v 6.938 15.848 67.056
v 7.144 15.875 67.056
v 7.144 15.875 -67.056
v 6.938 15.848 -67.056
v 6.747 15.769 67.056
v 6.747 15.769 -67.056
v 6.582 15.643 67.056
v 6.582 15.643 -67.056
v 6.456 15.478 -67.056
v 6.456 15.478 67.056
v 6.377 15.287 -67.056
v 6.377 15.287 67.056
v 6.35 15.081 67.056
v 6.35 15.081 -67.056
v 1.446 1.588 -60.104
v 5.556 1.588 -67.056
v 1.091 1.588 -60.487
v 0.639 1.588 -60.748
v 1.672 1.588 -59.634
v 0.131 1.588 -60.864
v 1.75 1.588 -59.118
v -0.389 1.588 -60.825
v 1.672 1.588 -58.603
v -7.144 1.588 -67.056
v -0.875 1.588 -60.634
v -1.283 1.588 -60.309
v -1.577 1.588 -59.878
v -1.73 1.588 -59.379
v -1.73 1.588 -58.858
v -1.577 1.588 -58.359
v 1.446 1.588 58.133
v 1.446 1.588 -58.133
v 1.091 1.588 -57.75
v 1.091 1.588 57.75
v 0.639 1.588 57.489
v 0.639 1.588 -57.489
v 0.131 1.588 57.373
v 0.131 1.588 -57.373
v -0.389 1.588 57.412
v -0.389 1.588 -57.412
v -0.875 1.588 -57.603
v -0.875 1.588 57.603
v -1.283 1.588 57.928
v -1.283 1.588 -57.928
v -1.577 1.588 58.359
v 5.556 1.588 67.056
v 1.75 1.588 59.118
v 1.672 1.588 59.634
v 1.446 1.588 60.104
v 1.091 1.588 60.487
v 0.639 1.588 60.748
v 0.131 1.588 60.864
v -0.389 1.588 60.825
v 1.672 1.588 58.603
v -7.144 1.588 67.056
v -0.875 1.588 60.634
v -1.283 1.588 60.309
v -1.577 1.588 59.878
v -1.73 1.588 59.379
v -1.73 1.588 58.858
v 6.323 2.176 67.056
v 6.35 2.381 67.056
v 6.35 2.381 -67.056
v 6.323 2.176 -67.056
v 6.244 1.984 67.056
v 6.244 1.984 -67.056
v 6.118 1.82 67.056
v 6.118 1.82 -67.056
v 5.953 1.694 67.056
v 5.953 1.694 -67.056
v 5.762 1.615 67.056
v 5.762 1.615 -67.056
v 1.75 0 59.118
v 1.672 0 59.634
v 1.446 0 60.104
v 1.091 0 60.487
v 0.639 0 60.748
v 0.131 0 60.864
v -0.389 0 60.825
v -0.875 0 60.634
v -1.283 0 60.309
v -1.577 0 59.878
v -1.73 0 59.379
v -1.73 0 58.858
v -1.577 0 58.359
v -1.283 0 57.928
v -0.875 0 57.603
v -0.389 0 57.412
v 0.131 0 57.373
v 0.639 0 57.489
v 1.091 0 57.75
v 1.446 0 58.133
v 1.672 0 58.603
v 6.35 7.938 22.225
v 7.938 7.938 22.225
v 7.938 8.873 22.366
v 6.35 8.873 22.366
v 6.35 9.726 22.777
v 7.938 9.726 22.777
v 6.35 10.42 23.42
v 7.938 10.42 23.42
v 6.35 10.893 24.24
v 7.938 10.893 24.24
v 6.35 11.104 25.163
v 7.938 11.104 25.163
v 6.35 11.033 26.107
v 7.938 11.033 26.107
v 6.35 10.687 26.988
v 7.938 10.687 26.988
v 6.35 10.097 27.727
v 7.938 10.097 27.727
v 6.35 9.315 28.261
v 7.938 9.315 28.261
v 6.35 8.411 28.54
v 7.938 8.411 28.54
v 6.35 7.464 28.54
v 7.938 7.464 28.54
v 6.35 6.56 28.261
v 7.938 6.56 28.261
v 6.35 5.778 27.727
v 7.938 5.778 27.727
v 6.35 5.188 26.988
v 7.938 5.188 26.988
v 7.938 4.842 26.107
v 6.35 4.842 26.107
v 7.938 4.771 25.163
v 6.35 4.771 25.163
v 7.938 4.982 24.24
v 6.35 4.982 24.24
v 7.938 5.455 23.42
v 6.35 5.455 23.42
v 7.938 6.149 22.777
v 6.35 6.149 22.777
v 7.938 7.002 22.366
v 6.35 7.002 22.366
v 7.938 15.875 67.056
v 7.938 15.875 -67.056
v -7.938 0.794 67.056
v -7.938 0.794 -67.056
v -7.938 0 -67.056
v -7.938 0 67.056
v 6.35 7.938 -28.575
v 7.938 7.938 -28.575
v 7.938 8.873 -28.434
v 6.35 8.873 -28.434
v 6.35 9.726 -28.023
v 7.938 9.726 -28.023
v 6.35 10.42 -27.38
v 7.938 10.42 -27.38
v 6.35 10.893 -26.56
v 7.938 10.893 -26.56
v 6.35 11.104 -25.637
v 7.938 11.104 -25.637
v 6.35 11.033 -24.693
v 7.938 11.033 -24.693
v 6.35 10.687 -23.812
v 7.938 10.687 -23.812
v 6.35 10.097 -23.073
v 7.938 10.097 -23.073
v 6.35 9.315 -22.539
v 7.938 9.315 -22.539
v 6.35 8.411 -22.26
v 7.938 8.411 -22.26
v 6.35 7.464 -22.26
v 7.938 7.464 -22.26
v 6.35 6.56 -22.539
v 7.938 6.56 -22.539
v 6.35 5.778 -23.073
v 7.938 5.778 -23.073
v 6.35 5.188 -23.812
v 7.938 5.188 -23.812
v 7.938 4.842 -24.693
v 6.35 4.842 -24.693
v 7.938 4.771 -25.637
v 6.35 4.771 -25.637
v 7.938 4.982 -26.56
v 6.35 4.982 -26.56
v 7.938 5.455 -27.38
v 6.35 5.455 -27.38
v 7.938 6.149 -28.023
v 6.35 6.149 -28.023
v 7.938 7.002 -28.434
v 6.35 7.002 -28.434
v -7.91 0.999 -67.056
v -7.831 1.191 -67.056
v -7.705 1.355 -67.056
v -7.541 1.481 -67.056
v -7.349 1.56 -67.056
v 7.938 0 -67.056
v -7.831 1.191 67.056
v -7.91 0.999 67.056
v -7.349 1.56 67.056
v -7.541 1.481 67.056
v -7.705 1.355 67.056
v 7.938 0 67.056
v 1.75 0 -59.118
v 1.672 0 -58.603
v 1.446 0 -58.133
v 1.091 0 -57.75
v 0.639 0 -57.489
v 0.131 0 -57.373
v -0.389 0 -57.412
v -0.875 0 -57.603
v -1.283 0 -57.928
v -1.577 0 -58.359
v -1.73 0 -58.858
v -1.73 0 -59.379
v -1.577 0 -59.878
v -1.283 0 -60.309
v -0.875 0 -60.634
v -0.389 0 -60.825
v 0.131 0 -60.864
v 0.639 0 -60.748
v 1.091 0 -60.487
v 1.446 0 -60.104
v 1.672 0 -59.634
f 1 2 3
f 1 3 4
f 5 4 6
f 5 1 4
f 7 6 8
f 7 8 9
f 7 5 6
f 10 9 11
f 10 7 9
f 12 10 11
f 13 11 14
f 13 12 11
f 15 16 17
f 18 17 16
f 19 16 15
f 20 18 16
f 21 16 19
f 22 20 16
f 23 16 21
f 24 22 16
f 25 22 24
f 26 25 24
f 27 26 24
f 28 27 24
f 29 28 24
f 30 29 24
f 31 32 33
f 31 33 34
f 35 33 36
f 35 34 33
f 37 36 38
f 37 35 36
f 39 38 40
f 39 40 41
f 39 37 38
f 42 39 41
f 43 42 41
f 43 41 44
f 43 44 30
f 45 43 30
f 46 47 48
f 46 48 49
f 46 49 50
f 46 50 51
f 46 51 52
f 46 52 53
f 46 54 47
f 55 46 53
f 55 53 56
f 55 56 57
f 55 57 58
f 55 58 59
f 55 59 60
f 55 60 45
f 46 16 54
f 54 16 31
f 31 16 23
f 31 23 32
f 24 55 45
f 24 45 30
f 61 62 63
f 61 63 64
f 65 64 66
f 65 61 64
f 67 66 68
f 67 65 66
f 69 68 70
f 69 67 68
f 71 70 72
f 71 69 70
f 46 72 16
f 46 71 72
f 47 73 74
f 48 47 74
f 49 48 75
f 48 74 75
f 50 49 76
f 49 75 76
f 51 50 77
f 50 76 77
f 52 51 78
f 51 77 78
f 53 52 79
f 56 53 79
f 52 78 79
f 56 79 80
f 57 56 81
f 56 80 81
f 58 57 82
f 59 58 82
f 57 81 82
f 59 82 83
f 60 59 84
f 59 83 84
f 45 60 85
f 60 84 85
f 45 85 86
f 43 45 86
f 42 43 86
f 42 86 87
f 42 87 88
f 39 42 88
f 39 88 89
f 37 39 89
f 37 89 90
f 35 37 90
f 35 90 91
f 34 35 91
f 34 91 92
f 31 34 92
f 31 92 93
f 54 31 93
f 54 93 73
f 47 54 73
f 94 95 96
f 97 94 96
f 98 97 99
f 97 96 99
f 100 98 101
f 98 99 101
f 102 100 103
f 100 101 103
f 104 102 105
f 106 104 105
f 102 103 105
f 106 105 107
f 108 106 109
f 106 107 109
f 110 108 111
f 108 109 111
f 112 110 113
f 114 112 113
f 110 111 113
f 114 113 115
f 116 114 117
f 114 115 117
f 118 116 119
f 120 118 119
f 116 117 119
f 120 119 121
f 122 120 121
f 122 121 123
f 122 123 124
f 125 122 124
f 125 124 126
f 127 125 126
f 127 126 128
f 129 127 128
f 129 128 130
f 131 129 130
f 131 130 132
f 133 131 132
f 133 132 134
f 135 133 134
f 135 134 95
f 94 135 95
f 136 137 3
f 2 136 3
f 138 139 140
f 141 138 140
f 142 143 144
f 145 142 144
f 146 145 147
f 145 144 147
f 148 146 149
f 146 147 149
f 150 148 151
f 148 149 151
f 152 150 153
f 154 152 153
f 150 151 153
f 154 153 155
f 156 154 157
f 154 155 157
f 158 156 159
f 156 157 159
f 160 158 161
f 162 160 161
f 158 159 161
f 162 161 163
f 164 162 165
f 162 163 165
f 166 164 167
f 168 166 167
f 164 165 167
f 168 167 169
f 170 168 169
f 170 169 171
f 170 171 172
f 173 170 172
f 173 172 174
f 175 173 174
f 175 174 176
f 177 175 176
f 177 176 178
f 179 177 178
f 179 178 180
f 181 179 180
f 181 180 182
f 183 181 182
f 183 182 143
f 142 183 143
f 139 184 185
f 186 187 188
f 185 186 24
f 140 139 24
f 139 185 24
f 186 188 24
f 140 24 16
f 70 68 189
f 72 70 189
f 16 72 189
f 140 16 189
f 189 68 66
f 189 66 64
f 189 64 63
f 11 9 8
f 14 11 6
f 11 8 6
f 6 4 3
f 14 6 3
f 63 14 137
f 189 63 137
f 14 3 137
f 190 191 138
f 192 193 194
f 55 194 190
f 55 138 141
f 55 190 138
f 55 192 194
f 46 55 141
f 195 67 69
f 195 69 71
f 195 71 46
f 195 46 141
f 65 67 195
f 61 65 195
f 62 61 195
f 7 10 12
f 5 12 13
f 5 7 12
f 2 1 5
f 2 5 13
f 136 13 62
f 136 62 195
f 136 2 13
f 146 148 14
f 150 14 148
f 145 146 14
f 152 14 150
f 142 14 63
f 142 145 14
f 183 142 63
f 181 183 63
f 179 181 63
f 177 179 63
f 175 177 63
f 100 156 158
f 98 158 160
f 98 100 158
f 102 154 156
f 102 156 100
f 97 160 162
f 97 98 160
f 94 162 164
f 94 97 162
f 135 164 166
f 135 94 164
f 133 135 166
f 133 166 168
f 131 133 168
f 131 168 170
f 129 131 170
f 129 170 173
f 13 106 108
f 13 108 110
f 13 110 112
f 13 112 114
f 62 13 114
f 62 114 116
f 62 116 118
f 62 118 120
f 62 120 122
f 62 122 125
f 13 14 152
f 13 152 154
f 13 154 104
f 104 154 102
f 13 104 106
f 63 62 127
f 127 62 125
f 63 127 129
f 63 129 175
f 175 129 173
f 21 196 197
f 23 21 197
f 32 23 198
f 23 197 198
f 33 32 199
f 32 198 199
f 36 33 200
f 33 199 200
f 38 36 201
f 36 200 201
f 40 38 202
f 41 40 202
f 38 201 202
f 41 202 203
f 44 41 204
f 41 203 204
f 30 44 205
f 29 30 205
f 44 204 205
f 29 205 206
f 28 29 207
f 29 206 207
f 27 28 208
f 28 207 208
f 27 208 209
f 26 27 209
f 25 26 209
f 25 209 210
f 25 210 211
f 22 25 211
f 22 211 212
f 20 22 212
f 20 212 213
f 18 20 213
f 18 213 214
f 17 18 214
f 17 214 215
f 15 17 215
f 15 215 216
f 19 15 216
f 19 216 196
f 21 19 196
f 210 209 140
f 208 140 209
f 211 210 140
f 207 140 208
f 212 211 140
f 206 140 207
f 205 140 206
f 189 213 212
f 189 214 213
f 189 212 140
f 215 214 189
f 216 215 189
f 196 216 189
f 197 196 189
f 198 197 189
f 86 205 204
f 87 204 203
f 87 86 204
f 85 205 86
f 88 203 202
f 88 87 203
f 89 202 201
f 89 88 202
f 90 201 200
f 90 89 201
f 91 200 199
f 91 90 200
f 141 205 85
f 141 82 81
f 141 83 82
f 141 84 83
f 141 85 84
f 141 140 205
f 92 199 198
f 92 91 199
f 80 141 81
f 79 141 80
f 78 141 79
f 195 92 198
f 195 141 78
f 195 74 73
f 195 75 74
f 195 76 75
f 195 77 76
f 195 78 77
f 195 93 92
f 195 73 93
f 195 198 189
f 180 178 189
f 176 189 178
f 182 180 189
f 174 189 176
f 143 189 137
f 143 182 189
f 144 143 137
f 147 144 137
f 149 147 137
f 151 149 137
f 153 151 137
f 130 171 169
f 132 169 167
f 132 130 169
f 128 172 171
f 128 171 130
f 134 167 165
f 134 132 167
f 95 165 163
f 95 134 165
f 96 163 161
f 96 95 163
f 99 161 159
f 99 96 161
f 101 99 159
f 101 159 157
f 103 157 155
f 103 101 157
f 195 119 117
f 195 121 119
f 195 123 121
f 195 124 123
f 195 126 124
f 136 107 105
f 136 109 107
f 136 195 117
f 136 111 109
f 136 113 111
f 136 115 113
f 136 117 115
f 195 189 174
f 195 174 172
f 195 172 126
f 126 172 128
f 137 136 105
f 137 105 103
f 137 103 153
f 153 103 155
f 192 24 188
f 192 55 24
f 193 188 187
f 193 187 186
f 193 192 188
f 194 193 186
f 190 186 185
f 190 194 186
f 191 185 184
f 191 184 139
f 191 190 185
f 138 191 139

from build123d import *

# Parameters (mm, degrees)
BOSS_EXTRUDE1_DEPTH = 67.056
SKETCH3_R           = 3.175
CUT_EXTRUDE1_DEPTH  = 16.875
SKETCH4_R           = 1.7500092
CUT_EXTRUDE2_DEPTH  = 16.875


with BuildPart() as part:
    # Sketch2 → Boss-Extrude1 (new body, symmetric)
    with BuildSketch(Plane.XY):
        with BuildLine():
            Line((-7.9375, 0), (7.9375, 0))
            Line((7.9375, 0), (7.9375, 15.875))
            Line((7.9375, 15.875), (7.14375, 15.875))
            ThreePointArc((7.14375, 15.875), (6.582483992, 15.642516008), (6.35, 15.08125))
            Line((6.35, 15.08125), (6.35, 2.38125))
            ThreePointArc((6.35, 2.38125), (6.117516008, 1.819983992), (5.55625, 1.5875))
            Line((5.55625, 1.5875), (-7.14375, 1.5875))
            ThreePointArc((-7.14375, 1.5875), (-7.705016008, 1.355016008), (-7.9375, 0.79375))
            Line((-7.9375, 0.79375), (-7.9375, 0))
        make_face()
    extrude(amount=BOSS_EXTRUDE1_DEPTH, both=True)

    # Sketch3 → Cut-Extrude1 (cut, through all)
    with BuildSketch(Plane(origin=(7.9375, 0, 0), x_dir=(0, 0, -1), z_dir=(1, 0, 0))):
        with Locations((-25.4, 7.9375)):
            Circle(SKETCH3_R)
        with Locations((25.4, 7.9375)):
            Circle(SKETCH3_R)
    extrude(amount=-CUT_EXTRUDE1_DEPTH, mode=Mode.SUBTRACT)

    # Sketch4 → Cut-Extrude2 (cut, through all)
    with BuildSketch(Plane.XZ):
        with Locations((0, -59.1185)):
            Circle(SKETCH4_R)
        with Locations((0, 59.1185)):
            Circle(SKETCH4_R)
    extrude(amount=-CUT_EXTRUDE2_DEPTH, mode=Mode.SUBTRACT)


solid = part.part
